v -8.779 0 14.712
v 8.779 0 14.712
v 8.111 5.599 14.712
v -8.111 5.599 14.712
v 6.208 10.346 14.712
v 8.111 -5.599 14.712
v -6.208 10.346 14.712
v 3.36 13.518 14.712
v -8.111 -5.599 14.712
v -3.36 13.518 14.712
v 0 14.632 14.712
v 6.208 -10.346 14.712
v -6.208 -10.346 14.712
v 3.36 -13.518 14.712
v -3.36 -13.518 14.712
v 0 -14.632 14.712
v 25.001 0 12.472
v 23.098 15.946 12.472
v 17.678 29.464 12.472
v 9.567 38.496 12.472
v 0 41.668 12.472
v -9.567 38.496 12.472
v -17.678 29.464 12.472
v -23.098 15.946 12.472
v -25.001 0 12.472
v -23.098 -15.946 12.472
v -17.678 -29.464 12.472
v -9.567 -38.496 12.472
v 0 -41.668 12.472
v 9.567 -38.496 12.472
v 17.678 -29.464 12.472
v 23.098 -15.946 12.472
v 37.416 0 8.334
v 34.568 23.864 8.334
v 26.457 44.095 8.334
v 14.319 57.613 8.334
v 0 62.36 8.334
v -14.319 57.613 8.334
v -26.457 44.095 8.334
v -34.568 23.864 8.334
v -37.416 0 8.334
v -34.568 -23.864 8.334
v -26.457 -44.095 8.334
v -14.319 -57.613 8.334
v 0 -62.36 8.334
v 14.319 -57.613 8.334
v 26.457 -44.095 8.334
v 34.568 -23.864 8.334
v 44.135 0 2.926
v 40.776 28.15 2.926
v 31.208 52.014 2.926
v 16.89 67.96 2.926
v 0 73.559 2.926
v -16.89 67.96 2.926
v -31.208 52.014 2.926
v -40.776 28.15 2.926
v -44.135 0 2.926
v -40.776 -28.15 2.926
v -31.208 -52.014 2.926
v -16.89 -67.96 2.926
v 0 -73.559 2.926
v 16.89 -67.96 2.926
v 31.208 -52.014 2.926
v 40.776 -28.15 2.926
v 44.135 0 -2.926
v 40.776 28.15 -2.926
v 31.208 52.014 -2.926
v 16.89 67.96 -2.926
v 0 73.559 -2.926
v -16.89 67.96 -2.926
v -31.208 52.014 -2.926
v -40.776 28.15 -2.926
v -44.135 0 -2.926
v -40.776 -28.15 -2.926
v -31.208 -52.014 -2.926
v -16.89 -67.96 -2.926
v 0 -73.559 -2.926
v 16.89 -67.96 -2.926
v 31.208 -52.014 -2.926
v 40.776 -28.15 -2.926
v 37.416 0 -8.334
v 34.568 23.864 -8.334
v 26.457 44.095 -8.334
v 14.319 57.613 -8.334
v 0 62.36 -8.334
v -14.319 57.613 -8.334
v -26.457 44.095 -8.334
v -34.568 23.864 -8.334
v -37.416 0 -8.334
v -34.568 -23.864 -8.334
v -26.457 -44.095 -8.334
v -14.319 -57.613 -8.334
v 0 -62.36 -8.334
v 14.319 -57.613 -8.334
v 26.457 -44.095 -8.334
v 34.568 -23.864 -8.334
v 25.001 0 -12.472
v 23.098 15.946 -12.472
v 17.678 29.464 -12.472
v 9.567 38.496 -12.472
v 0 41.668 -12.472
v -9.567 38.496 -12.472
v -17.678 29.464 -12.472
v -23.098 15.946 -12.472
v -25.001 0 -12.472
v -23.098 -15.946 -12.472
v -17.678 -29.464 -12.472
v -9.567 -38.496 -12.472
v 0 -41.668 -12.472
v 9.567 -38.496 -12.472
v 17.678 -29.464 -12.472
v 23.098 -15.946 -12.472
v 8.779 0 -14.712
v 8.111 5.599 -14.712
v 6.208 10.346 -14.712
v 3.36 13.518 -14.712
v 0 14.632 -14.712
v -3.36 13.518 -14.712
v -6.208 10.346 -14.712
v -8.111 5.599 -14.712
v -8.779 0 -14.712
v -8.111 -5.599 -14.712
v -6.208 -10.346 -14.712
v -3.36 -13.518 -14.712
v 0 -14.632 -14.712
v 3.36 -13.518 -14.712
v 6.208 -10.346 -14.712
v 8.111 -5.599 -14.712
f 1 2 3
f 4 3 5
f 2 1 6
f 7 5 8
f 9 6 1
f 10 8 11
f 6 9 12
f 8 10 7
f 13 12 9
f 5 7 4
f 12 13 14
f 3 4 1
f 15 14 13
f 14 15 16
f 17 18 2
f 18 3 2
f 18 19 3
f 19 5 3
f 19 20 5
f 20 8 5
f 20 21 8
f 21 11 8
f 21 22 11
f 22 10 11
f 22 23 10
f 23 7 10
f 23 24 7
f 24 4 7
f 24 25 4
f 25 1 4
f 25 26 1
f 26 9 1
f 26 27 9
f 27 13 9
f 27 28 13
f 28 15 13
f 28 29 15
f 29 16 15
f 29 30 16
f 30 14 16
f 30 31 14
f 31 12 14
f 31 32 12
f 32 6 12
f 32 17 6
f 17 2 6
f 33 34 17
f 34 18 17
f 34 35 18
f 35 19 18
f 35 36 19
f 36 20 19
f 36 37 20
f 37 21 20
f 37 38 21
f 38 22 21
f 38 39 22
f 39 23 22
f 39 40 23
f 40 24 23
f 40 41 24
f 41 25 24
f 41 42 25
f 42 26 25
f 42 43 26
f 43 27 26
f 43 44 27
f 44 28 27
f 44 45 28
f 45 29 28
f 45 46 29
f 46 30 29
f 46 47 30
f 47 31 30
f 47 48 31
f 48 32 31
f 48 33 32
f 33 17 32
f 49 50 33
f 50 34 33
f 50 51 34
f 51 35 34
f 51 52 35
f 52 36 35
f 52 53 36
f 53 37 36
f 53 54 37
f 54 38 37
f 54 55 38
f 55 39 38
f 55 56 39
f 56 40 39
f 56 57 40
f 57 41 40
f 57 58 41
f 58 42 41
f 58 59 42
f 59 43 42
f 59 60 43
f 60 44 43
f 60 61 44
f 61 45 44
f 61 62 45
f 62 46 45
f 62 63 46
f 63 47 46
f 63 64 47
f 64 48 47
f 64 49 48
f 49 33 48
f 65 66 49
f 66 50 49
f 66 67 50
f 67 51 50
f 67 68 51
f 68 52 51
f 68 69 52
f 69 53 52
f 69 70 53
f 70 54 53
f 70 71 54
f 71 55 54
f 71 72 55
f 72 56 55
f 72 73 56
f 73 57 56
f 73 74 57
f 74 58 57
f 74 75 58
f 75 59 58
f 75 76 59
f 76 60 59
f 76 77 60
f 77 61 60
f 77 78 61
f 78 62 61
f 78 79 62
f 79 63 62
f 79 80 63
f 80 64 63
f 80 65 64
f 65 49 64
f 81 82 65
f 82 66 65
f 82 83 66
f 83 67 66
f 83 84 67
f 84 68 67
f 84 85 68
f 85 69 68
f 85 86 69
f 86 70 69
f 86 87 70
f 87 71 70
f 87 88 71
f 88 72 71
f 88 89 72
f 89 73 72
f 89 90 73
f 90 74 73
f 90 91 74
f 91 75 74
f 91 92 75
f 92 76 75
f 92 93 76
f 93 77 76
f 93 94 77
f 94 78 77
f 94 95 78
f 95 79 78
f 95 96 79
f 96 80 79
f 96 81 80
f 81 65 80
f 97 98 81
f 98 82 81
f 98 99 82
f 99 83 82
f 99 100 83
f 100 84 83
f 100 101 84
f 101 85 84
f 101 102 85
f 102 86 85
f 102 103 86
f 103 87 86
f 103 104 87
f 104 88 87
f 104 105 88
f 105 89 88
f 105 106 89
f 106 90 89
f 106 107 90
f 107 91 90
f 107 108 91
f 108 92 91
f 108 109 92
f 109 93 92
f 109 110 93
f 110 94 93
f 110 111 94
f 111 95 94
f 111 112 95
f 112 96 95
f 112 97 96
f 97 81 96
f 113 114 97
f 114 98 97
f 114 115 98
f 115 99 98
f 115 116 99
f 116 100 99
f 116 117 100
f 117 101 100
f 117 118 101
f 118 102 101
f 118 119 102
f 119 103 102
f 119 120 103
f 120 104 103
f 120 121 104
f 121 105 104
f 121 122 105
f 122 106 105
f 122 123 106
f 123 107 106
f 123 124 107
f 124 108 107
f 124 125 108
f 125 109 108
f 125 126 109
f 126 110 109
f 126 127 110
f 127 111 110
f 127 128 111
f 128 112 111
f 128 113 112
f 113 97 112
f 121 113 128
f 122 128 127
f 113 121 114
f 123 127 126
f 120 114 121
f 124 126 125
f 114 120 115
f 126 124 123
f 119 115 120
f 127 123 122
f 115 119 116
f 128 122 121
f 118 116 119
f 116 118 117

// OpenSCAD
// Generated by SolidPython 1.0.1 on 2020-07-29 00:46:49


scale(v = [9, 15, 3]) {
	sphere(r = 5);
}
/***********************************************
*********      SolidPython code:      **********
************************************************
 
# import packages: SolidPython
from solid import *
from solid.utils import *
from itertools import chain, combinations, permutations


class Resize:

    def __init__(self, scad_file):
        self.scad_file = scad_file
        #self.scad_file = import_scad(scad_file)
        # cone/cylinder param:
        self.r1 = 0
        self.r2 = 0
        self.h = 0
        # rectangular prism param:
        self.w = 0
        self.l = 0
        # ellipse param:
        self.r = 0

    # import OpenScad code (file name corresponds to shape)


    # classify shape + parameters
    def assign(self, param1, param2, param3):
        if self.scad_file == 'cone.scad':
            self.r1 = param1
            self.r2 = param2
            self.h = param3
        elif self.scad_file == 'cylinder.scad':
            self.r1 = param1
            self.r2 = param2
            self.h = param3
        elif self.scad_file == 'rectangularPrism.scad':
            self.h = param1
            self.l = param2
            self.w = param3
        else:
            self.r = param1
            self.h = param2

    # resize parameters
    def iterate(self):
        x = range(3, 20, 2)
        i = 1
        if self.scad_file == 'cone.scad':
            tempList = list(permutations(x, 2))
            for temp in tempList:
                param1 = temp[0]
                param2 = temp[1]
                filepath = 'produced_scad_files/' + 'cone' + str(param1) + '_' + str(param2) + '_' + '.scad'
                scad_render_to_file(cylinder(h=param1, r1=param2, r2=0), filepath)

        elif self.scad_file == 'cylinder.scad':
            tempList = list(permutations(x, 3))
            for temp in tempList:
                param1 = temp[0]
                param2 = temp[1]
                filepath = 'produced_scad_files/' + 'cylinder' + str(param1) + '_' + str(param2) + '_' + '.scad'
                scad_render_to_file(cylinder(h=param1, r1=param2, r2=param2), filepath)

        elif self.scad_file == 'rectangularPrism.scad':
            tempList = list(permutations(x, 3))
            for temp in tempList:
                param1 = temp[0]
                param2 = temp[1]
                param3 = temp[2]
                filepath = 'produced_scad_files/' + 'rectangularPrism' + str(param1) + '_' + str(param2) + '_' + str(
                    param3) + '.scad'
                scad_render_to_file(cube(size=(param1, param2, param3)), filepath)

        elif self.scad_file == 'ellipse.scad':
            tempList = list(permutations(x, 4))
            for temp in tempList:
                param1 = temp[0]
                param2 = temp[1]
                param3 = temp[2]
                param4 = temp[3]
                filepath = 'produced_scad_files/' + 'ellipse' + str(param1) + '_' + str(param2) + '_' + str(param3) + '_' + str(param4) + '.scad'
                scad_render_to_file(scale([param1, param2, param3])(sphere(r=param4)), filepath)

    def render_to_scadfile(self):
        scad_render_to_file(scad, 'example.scad') 
 
************************************************/
